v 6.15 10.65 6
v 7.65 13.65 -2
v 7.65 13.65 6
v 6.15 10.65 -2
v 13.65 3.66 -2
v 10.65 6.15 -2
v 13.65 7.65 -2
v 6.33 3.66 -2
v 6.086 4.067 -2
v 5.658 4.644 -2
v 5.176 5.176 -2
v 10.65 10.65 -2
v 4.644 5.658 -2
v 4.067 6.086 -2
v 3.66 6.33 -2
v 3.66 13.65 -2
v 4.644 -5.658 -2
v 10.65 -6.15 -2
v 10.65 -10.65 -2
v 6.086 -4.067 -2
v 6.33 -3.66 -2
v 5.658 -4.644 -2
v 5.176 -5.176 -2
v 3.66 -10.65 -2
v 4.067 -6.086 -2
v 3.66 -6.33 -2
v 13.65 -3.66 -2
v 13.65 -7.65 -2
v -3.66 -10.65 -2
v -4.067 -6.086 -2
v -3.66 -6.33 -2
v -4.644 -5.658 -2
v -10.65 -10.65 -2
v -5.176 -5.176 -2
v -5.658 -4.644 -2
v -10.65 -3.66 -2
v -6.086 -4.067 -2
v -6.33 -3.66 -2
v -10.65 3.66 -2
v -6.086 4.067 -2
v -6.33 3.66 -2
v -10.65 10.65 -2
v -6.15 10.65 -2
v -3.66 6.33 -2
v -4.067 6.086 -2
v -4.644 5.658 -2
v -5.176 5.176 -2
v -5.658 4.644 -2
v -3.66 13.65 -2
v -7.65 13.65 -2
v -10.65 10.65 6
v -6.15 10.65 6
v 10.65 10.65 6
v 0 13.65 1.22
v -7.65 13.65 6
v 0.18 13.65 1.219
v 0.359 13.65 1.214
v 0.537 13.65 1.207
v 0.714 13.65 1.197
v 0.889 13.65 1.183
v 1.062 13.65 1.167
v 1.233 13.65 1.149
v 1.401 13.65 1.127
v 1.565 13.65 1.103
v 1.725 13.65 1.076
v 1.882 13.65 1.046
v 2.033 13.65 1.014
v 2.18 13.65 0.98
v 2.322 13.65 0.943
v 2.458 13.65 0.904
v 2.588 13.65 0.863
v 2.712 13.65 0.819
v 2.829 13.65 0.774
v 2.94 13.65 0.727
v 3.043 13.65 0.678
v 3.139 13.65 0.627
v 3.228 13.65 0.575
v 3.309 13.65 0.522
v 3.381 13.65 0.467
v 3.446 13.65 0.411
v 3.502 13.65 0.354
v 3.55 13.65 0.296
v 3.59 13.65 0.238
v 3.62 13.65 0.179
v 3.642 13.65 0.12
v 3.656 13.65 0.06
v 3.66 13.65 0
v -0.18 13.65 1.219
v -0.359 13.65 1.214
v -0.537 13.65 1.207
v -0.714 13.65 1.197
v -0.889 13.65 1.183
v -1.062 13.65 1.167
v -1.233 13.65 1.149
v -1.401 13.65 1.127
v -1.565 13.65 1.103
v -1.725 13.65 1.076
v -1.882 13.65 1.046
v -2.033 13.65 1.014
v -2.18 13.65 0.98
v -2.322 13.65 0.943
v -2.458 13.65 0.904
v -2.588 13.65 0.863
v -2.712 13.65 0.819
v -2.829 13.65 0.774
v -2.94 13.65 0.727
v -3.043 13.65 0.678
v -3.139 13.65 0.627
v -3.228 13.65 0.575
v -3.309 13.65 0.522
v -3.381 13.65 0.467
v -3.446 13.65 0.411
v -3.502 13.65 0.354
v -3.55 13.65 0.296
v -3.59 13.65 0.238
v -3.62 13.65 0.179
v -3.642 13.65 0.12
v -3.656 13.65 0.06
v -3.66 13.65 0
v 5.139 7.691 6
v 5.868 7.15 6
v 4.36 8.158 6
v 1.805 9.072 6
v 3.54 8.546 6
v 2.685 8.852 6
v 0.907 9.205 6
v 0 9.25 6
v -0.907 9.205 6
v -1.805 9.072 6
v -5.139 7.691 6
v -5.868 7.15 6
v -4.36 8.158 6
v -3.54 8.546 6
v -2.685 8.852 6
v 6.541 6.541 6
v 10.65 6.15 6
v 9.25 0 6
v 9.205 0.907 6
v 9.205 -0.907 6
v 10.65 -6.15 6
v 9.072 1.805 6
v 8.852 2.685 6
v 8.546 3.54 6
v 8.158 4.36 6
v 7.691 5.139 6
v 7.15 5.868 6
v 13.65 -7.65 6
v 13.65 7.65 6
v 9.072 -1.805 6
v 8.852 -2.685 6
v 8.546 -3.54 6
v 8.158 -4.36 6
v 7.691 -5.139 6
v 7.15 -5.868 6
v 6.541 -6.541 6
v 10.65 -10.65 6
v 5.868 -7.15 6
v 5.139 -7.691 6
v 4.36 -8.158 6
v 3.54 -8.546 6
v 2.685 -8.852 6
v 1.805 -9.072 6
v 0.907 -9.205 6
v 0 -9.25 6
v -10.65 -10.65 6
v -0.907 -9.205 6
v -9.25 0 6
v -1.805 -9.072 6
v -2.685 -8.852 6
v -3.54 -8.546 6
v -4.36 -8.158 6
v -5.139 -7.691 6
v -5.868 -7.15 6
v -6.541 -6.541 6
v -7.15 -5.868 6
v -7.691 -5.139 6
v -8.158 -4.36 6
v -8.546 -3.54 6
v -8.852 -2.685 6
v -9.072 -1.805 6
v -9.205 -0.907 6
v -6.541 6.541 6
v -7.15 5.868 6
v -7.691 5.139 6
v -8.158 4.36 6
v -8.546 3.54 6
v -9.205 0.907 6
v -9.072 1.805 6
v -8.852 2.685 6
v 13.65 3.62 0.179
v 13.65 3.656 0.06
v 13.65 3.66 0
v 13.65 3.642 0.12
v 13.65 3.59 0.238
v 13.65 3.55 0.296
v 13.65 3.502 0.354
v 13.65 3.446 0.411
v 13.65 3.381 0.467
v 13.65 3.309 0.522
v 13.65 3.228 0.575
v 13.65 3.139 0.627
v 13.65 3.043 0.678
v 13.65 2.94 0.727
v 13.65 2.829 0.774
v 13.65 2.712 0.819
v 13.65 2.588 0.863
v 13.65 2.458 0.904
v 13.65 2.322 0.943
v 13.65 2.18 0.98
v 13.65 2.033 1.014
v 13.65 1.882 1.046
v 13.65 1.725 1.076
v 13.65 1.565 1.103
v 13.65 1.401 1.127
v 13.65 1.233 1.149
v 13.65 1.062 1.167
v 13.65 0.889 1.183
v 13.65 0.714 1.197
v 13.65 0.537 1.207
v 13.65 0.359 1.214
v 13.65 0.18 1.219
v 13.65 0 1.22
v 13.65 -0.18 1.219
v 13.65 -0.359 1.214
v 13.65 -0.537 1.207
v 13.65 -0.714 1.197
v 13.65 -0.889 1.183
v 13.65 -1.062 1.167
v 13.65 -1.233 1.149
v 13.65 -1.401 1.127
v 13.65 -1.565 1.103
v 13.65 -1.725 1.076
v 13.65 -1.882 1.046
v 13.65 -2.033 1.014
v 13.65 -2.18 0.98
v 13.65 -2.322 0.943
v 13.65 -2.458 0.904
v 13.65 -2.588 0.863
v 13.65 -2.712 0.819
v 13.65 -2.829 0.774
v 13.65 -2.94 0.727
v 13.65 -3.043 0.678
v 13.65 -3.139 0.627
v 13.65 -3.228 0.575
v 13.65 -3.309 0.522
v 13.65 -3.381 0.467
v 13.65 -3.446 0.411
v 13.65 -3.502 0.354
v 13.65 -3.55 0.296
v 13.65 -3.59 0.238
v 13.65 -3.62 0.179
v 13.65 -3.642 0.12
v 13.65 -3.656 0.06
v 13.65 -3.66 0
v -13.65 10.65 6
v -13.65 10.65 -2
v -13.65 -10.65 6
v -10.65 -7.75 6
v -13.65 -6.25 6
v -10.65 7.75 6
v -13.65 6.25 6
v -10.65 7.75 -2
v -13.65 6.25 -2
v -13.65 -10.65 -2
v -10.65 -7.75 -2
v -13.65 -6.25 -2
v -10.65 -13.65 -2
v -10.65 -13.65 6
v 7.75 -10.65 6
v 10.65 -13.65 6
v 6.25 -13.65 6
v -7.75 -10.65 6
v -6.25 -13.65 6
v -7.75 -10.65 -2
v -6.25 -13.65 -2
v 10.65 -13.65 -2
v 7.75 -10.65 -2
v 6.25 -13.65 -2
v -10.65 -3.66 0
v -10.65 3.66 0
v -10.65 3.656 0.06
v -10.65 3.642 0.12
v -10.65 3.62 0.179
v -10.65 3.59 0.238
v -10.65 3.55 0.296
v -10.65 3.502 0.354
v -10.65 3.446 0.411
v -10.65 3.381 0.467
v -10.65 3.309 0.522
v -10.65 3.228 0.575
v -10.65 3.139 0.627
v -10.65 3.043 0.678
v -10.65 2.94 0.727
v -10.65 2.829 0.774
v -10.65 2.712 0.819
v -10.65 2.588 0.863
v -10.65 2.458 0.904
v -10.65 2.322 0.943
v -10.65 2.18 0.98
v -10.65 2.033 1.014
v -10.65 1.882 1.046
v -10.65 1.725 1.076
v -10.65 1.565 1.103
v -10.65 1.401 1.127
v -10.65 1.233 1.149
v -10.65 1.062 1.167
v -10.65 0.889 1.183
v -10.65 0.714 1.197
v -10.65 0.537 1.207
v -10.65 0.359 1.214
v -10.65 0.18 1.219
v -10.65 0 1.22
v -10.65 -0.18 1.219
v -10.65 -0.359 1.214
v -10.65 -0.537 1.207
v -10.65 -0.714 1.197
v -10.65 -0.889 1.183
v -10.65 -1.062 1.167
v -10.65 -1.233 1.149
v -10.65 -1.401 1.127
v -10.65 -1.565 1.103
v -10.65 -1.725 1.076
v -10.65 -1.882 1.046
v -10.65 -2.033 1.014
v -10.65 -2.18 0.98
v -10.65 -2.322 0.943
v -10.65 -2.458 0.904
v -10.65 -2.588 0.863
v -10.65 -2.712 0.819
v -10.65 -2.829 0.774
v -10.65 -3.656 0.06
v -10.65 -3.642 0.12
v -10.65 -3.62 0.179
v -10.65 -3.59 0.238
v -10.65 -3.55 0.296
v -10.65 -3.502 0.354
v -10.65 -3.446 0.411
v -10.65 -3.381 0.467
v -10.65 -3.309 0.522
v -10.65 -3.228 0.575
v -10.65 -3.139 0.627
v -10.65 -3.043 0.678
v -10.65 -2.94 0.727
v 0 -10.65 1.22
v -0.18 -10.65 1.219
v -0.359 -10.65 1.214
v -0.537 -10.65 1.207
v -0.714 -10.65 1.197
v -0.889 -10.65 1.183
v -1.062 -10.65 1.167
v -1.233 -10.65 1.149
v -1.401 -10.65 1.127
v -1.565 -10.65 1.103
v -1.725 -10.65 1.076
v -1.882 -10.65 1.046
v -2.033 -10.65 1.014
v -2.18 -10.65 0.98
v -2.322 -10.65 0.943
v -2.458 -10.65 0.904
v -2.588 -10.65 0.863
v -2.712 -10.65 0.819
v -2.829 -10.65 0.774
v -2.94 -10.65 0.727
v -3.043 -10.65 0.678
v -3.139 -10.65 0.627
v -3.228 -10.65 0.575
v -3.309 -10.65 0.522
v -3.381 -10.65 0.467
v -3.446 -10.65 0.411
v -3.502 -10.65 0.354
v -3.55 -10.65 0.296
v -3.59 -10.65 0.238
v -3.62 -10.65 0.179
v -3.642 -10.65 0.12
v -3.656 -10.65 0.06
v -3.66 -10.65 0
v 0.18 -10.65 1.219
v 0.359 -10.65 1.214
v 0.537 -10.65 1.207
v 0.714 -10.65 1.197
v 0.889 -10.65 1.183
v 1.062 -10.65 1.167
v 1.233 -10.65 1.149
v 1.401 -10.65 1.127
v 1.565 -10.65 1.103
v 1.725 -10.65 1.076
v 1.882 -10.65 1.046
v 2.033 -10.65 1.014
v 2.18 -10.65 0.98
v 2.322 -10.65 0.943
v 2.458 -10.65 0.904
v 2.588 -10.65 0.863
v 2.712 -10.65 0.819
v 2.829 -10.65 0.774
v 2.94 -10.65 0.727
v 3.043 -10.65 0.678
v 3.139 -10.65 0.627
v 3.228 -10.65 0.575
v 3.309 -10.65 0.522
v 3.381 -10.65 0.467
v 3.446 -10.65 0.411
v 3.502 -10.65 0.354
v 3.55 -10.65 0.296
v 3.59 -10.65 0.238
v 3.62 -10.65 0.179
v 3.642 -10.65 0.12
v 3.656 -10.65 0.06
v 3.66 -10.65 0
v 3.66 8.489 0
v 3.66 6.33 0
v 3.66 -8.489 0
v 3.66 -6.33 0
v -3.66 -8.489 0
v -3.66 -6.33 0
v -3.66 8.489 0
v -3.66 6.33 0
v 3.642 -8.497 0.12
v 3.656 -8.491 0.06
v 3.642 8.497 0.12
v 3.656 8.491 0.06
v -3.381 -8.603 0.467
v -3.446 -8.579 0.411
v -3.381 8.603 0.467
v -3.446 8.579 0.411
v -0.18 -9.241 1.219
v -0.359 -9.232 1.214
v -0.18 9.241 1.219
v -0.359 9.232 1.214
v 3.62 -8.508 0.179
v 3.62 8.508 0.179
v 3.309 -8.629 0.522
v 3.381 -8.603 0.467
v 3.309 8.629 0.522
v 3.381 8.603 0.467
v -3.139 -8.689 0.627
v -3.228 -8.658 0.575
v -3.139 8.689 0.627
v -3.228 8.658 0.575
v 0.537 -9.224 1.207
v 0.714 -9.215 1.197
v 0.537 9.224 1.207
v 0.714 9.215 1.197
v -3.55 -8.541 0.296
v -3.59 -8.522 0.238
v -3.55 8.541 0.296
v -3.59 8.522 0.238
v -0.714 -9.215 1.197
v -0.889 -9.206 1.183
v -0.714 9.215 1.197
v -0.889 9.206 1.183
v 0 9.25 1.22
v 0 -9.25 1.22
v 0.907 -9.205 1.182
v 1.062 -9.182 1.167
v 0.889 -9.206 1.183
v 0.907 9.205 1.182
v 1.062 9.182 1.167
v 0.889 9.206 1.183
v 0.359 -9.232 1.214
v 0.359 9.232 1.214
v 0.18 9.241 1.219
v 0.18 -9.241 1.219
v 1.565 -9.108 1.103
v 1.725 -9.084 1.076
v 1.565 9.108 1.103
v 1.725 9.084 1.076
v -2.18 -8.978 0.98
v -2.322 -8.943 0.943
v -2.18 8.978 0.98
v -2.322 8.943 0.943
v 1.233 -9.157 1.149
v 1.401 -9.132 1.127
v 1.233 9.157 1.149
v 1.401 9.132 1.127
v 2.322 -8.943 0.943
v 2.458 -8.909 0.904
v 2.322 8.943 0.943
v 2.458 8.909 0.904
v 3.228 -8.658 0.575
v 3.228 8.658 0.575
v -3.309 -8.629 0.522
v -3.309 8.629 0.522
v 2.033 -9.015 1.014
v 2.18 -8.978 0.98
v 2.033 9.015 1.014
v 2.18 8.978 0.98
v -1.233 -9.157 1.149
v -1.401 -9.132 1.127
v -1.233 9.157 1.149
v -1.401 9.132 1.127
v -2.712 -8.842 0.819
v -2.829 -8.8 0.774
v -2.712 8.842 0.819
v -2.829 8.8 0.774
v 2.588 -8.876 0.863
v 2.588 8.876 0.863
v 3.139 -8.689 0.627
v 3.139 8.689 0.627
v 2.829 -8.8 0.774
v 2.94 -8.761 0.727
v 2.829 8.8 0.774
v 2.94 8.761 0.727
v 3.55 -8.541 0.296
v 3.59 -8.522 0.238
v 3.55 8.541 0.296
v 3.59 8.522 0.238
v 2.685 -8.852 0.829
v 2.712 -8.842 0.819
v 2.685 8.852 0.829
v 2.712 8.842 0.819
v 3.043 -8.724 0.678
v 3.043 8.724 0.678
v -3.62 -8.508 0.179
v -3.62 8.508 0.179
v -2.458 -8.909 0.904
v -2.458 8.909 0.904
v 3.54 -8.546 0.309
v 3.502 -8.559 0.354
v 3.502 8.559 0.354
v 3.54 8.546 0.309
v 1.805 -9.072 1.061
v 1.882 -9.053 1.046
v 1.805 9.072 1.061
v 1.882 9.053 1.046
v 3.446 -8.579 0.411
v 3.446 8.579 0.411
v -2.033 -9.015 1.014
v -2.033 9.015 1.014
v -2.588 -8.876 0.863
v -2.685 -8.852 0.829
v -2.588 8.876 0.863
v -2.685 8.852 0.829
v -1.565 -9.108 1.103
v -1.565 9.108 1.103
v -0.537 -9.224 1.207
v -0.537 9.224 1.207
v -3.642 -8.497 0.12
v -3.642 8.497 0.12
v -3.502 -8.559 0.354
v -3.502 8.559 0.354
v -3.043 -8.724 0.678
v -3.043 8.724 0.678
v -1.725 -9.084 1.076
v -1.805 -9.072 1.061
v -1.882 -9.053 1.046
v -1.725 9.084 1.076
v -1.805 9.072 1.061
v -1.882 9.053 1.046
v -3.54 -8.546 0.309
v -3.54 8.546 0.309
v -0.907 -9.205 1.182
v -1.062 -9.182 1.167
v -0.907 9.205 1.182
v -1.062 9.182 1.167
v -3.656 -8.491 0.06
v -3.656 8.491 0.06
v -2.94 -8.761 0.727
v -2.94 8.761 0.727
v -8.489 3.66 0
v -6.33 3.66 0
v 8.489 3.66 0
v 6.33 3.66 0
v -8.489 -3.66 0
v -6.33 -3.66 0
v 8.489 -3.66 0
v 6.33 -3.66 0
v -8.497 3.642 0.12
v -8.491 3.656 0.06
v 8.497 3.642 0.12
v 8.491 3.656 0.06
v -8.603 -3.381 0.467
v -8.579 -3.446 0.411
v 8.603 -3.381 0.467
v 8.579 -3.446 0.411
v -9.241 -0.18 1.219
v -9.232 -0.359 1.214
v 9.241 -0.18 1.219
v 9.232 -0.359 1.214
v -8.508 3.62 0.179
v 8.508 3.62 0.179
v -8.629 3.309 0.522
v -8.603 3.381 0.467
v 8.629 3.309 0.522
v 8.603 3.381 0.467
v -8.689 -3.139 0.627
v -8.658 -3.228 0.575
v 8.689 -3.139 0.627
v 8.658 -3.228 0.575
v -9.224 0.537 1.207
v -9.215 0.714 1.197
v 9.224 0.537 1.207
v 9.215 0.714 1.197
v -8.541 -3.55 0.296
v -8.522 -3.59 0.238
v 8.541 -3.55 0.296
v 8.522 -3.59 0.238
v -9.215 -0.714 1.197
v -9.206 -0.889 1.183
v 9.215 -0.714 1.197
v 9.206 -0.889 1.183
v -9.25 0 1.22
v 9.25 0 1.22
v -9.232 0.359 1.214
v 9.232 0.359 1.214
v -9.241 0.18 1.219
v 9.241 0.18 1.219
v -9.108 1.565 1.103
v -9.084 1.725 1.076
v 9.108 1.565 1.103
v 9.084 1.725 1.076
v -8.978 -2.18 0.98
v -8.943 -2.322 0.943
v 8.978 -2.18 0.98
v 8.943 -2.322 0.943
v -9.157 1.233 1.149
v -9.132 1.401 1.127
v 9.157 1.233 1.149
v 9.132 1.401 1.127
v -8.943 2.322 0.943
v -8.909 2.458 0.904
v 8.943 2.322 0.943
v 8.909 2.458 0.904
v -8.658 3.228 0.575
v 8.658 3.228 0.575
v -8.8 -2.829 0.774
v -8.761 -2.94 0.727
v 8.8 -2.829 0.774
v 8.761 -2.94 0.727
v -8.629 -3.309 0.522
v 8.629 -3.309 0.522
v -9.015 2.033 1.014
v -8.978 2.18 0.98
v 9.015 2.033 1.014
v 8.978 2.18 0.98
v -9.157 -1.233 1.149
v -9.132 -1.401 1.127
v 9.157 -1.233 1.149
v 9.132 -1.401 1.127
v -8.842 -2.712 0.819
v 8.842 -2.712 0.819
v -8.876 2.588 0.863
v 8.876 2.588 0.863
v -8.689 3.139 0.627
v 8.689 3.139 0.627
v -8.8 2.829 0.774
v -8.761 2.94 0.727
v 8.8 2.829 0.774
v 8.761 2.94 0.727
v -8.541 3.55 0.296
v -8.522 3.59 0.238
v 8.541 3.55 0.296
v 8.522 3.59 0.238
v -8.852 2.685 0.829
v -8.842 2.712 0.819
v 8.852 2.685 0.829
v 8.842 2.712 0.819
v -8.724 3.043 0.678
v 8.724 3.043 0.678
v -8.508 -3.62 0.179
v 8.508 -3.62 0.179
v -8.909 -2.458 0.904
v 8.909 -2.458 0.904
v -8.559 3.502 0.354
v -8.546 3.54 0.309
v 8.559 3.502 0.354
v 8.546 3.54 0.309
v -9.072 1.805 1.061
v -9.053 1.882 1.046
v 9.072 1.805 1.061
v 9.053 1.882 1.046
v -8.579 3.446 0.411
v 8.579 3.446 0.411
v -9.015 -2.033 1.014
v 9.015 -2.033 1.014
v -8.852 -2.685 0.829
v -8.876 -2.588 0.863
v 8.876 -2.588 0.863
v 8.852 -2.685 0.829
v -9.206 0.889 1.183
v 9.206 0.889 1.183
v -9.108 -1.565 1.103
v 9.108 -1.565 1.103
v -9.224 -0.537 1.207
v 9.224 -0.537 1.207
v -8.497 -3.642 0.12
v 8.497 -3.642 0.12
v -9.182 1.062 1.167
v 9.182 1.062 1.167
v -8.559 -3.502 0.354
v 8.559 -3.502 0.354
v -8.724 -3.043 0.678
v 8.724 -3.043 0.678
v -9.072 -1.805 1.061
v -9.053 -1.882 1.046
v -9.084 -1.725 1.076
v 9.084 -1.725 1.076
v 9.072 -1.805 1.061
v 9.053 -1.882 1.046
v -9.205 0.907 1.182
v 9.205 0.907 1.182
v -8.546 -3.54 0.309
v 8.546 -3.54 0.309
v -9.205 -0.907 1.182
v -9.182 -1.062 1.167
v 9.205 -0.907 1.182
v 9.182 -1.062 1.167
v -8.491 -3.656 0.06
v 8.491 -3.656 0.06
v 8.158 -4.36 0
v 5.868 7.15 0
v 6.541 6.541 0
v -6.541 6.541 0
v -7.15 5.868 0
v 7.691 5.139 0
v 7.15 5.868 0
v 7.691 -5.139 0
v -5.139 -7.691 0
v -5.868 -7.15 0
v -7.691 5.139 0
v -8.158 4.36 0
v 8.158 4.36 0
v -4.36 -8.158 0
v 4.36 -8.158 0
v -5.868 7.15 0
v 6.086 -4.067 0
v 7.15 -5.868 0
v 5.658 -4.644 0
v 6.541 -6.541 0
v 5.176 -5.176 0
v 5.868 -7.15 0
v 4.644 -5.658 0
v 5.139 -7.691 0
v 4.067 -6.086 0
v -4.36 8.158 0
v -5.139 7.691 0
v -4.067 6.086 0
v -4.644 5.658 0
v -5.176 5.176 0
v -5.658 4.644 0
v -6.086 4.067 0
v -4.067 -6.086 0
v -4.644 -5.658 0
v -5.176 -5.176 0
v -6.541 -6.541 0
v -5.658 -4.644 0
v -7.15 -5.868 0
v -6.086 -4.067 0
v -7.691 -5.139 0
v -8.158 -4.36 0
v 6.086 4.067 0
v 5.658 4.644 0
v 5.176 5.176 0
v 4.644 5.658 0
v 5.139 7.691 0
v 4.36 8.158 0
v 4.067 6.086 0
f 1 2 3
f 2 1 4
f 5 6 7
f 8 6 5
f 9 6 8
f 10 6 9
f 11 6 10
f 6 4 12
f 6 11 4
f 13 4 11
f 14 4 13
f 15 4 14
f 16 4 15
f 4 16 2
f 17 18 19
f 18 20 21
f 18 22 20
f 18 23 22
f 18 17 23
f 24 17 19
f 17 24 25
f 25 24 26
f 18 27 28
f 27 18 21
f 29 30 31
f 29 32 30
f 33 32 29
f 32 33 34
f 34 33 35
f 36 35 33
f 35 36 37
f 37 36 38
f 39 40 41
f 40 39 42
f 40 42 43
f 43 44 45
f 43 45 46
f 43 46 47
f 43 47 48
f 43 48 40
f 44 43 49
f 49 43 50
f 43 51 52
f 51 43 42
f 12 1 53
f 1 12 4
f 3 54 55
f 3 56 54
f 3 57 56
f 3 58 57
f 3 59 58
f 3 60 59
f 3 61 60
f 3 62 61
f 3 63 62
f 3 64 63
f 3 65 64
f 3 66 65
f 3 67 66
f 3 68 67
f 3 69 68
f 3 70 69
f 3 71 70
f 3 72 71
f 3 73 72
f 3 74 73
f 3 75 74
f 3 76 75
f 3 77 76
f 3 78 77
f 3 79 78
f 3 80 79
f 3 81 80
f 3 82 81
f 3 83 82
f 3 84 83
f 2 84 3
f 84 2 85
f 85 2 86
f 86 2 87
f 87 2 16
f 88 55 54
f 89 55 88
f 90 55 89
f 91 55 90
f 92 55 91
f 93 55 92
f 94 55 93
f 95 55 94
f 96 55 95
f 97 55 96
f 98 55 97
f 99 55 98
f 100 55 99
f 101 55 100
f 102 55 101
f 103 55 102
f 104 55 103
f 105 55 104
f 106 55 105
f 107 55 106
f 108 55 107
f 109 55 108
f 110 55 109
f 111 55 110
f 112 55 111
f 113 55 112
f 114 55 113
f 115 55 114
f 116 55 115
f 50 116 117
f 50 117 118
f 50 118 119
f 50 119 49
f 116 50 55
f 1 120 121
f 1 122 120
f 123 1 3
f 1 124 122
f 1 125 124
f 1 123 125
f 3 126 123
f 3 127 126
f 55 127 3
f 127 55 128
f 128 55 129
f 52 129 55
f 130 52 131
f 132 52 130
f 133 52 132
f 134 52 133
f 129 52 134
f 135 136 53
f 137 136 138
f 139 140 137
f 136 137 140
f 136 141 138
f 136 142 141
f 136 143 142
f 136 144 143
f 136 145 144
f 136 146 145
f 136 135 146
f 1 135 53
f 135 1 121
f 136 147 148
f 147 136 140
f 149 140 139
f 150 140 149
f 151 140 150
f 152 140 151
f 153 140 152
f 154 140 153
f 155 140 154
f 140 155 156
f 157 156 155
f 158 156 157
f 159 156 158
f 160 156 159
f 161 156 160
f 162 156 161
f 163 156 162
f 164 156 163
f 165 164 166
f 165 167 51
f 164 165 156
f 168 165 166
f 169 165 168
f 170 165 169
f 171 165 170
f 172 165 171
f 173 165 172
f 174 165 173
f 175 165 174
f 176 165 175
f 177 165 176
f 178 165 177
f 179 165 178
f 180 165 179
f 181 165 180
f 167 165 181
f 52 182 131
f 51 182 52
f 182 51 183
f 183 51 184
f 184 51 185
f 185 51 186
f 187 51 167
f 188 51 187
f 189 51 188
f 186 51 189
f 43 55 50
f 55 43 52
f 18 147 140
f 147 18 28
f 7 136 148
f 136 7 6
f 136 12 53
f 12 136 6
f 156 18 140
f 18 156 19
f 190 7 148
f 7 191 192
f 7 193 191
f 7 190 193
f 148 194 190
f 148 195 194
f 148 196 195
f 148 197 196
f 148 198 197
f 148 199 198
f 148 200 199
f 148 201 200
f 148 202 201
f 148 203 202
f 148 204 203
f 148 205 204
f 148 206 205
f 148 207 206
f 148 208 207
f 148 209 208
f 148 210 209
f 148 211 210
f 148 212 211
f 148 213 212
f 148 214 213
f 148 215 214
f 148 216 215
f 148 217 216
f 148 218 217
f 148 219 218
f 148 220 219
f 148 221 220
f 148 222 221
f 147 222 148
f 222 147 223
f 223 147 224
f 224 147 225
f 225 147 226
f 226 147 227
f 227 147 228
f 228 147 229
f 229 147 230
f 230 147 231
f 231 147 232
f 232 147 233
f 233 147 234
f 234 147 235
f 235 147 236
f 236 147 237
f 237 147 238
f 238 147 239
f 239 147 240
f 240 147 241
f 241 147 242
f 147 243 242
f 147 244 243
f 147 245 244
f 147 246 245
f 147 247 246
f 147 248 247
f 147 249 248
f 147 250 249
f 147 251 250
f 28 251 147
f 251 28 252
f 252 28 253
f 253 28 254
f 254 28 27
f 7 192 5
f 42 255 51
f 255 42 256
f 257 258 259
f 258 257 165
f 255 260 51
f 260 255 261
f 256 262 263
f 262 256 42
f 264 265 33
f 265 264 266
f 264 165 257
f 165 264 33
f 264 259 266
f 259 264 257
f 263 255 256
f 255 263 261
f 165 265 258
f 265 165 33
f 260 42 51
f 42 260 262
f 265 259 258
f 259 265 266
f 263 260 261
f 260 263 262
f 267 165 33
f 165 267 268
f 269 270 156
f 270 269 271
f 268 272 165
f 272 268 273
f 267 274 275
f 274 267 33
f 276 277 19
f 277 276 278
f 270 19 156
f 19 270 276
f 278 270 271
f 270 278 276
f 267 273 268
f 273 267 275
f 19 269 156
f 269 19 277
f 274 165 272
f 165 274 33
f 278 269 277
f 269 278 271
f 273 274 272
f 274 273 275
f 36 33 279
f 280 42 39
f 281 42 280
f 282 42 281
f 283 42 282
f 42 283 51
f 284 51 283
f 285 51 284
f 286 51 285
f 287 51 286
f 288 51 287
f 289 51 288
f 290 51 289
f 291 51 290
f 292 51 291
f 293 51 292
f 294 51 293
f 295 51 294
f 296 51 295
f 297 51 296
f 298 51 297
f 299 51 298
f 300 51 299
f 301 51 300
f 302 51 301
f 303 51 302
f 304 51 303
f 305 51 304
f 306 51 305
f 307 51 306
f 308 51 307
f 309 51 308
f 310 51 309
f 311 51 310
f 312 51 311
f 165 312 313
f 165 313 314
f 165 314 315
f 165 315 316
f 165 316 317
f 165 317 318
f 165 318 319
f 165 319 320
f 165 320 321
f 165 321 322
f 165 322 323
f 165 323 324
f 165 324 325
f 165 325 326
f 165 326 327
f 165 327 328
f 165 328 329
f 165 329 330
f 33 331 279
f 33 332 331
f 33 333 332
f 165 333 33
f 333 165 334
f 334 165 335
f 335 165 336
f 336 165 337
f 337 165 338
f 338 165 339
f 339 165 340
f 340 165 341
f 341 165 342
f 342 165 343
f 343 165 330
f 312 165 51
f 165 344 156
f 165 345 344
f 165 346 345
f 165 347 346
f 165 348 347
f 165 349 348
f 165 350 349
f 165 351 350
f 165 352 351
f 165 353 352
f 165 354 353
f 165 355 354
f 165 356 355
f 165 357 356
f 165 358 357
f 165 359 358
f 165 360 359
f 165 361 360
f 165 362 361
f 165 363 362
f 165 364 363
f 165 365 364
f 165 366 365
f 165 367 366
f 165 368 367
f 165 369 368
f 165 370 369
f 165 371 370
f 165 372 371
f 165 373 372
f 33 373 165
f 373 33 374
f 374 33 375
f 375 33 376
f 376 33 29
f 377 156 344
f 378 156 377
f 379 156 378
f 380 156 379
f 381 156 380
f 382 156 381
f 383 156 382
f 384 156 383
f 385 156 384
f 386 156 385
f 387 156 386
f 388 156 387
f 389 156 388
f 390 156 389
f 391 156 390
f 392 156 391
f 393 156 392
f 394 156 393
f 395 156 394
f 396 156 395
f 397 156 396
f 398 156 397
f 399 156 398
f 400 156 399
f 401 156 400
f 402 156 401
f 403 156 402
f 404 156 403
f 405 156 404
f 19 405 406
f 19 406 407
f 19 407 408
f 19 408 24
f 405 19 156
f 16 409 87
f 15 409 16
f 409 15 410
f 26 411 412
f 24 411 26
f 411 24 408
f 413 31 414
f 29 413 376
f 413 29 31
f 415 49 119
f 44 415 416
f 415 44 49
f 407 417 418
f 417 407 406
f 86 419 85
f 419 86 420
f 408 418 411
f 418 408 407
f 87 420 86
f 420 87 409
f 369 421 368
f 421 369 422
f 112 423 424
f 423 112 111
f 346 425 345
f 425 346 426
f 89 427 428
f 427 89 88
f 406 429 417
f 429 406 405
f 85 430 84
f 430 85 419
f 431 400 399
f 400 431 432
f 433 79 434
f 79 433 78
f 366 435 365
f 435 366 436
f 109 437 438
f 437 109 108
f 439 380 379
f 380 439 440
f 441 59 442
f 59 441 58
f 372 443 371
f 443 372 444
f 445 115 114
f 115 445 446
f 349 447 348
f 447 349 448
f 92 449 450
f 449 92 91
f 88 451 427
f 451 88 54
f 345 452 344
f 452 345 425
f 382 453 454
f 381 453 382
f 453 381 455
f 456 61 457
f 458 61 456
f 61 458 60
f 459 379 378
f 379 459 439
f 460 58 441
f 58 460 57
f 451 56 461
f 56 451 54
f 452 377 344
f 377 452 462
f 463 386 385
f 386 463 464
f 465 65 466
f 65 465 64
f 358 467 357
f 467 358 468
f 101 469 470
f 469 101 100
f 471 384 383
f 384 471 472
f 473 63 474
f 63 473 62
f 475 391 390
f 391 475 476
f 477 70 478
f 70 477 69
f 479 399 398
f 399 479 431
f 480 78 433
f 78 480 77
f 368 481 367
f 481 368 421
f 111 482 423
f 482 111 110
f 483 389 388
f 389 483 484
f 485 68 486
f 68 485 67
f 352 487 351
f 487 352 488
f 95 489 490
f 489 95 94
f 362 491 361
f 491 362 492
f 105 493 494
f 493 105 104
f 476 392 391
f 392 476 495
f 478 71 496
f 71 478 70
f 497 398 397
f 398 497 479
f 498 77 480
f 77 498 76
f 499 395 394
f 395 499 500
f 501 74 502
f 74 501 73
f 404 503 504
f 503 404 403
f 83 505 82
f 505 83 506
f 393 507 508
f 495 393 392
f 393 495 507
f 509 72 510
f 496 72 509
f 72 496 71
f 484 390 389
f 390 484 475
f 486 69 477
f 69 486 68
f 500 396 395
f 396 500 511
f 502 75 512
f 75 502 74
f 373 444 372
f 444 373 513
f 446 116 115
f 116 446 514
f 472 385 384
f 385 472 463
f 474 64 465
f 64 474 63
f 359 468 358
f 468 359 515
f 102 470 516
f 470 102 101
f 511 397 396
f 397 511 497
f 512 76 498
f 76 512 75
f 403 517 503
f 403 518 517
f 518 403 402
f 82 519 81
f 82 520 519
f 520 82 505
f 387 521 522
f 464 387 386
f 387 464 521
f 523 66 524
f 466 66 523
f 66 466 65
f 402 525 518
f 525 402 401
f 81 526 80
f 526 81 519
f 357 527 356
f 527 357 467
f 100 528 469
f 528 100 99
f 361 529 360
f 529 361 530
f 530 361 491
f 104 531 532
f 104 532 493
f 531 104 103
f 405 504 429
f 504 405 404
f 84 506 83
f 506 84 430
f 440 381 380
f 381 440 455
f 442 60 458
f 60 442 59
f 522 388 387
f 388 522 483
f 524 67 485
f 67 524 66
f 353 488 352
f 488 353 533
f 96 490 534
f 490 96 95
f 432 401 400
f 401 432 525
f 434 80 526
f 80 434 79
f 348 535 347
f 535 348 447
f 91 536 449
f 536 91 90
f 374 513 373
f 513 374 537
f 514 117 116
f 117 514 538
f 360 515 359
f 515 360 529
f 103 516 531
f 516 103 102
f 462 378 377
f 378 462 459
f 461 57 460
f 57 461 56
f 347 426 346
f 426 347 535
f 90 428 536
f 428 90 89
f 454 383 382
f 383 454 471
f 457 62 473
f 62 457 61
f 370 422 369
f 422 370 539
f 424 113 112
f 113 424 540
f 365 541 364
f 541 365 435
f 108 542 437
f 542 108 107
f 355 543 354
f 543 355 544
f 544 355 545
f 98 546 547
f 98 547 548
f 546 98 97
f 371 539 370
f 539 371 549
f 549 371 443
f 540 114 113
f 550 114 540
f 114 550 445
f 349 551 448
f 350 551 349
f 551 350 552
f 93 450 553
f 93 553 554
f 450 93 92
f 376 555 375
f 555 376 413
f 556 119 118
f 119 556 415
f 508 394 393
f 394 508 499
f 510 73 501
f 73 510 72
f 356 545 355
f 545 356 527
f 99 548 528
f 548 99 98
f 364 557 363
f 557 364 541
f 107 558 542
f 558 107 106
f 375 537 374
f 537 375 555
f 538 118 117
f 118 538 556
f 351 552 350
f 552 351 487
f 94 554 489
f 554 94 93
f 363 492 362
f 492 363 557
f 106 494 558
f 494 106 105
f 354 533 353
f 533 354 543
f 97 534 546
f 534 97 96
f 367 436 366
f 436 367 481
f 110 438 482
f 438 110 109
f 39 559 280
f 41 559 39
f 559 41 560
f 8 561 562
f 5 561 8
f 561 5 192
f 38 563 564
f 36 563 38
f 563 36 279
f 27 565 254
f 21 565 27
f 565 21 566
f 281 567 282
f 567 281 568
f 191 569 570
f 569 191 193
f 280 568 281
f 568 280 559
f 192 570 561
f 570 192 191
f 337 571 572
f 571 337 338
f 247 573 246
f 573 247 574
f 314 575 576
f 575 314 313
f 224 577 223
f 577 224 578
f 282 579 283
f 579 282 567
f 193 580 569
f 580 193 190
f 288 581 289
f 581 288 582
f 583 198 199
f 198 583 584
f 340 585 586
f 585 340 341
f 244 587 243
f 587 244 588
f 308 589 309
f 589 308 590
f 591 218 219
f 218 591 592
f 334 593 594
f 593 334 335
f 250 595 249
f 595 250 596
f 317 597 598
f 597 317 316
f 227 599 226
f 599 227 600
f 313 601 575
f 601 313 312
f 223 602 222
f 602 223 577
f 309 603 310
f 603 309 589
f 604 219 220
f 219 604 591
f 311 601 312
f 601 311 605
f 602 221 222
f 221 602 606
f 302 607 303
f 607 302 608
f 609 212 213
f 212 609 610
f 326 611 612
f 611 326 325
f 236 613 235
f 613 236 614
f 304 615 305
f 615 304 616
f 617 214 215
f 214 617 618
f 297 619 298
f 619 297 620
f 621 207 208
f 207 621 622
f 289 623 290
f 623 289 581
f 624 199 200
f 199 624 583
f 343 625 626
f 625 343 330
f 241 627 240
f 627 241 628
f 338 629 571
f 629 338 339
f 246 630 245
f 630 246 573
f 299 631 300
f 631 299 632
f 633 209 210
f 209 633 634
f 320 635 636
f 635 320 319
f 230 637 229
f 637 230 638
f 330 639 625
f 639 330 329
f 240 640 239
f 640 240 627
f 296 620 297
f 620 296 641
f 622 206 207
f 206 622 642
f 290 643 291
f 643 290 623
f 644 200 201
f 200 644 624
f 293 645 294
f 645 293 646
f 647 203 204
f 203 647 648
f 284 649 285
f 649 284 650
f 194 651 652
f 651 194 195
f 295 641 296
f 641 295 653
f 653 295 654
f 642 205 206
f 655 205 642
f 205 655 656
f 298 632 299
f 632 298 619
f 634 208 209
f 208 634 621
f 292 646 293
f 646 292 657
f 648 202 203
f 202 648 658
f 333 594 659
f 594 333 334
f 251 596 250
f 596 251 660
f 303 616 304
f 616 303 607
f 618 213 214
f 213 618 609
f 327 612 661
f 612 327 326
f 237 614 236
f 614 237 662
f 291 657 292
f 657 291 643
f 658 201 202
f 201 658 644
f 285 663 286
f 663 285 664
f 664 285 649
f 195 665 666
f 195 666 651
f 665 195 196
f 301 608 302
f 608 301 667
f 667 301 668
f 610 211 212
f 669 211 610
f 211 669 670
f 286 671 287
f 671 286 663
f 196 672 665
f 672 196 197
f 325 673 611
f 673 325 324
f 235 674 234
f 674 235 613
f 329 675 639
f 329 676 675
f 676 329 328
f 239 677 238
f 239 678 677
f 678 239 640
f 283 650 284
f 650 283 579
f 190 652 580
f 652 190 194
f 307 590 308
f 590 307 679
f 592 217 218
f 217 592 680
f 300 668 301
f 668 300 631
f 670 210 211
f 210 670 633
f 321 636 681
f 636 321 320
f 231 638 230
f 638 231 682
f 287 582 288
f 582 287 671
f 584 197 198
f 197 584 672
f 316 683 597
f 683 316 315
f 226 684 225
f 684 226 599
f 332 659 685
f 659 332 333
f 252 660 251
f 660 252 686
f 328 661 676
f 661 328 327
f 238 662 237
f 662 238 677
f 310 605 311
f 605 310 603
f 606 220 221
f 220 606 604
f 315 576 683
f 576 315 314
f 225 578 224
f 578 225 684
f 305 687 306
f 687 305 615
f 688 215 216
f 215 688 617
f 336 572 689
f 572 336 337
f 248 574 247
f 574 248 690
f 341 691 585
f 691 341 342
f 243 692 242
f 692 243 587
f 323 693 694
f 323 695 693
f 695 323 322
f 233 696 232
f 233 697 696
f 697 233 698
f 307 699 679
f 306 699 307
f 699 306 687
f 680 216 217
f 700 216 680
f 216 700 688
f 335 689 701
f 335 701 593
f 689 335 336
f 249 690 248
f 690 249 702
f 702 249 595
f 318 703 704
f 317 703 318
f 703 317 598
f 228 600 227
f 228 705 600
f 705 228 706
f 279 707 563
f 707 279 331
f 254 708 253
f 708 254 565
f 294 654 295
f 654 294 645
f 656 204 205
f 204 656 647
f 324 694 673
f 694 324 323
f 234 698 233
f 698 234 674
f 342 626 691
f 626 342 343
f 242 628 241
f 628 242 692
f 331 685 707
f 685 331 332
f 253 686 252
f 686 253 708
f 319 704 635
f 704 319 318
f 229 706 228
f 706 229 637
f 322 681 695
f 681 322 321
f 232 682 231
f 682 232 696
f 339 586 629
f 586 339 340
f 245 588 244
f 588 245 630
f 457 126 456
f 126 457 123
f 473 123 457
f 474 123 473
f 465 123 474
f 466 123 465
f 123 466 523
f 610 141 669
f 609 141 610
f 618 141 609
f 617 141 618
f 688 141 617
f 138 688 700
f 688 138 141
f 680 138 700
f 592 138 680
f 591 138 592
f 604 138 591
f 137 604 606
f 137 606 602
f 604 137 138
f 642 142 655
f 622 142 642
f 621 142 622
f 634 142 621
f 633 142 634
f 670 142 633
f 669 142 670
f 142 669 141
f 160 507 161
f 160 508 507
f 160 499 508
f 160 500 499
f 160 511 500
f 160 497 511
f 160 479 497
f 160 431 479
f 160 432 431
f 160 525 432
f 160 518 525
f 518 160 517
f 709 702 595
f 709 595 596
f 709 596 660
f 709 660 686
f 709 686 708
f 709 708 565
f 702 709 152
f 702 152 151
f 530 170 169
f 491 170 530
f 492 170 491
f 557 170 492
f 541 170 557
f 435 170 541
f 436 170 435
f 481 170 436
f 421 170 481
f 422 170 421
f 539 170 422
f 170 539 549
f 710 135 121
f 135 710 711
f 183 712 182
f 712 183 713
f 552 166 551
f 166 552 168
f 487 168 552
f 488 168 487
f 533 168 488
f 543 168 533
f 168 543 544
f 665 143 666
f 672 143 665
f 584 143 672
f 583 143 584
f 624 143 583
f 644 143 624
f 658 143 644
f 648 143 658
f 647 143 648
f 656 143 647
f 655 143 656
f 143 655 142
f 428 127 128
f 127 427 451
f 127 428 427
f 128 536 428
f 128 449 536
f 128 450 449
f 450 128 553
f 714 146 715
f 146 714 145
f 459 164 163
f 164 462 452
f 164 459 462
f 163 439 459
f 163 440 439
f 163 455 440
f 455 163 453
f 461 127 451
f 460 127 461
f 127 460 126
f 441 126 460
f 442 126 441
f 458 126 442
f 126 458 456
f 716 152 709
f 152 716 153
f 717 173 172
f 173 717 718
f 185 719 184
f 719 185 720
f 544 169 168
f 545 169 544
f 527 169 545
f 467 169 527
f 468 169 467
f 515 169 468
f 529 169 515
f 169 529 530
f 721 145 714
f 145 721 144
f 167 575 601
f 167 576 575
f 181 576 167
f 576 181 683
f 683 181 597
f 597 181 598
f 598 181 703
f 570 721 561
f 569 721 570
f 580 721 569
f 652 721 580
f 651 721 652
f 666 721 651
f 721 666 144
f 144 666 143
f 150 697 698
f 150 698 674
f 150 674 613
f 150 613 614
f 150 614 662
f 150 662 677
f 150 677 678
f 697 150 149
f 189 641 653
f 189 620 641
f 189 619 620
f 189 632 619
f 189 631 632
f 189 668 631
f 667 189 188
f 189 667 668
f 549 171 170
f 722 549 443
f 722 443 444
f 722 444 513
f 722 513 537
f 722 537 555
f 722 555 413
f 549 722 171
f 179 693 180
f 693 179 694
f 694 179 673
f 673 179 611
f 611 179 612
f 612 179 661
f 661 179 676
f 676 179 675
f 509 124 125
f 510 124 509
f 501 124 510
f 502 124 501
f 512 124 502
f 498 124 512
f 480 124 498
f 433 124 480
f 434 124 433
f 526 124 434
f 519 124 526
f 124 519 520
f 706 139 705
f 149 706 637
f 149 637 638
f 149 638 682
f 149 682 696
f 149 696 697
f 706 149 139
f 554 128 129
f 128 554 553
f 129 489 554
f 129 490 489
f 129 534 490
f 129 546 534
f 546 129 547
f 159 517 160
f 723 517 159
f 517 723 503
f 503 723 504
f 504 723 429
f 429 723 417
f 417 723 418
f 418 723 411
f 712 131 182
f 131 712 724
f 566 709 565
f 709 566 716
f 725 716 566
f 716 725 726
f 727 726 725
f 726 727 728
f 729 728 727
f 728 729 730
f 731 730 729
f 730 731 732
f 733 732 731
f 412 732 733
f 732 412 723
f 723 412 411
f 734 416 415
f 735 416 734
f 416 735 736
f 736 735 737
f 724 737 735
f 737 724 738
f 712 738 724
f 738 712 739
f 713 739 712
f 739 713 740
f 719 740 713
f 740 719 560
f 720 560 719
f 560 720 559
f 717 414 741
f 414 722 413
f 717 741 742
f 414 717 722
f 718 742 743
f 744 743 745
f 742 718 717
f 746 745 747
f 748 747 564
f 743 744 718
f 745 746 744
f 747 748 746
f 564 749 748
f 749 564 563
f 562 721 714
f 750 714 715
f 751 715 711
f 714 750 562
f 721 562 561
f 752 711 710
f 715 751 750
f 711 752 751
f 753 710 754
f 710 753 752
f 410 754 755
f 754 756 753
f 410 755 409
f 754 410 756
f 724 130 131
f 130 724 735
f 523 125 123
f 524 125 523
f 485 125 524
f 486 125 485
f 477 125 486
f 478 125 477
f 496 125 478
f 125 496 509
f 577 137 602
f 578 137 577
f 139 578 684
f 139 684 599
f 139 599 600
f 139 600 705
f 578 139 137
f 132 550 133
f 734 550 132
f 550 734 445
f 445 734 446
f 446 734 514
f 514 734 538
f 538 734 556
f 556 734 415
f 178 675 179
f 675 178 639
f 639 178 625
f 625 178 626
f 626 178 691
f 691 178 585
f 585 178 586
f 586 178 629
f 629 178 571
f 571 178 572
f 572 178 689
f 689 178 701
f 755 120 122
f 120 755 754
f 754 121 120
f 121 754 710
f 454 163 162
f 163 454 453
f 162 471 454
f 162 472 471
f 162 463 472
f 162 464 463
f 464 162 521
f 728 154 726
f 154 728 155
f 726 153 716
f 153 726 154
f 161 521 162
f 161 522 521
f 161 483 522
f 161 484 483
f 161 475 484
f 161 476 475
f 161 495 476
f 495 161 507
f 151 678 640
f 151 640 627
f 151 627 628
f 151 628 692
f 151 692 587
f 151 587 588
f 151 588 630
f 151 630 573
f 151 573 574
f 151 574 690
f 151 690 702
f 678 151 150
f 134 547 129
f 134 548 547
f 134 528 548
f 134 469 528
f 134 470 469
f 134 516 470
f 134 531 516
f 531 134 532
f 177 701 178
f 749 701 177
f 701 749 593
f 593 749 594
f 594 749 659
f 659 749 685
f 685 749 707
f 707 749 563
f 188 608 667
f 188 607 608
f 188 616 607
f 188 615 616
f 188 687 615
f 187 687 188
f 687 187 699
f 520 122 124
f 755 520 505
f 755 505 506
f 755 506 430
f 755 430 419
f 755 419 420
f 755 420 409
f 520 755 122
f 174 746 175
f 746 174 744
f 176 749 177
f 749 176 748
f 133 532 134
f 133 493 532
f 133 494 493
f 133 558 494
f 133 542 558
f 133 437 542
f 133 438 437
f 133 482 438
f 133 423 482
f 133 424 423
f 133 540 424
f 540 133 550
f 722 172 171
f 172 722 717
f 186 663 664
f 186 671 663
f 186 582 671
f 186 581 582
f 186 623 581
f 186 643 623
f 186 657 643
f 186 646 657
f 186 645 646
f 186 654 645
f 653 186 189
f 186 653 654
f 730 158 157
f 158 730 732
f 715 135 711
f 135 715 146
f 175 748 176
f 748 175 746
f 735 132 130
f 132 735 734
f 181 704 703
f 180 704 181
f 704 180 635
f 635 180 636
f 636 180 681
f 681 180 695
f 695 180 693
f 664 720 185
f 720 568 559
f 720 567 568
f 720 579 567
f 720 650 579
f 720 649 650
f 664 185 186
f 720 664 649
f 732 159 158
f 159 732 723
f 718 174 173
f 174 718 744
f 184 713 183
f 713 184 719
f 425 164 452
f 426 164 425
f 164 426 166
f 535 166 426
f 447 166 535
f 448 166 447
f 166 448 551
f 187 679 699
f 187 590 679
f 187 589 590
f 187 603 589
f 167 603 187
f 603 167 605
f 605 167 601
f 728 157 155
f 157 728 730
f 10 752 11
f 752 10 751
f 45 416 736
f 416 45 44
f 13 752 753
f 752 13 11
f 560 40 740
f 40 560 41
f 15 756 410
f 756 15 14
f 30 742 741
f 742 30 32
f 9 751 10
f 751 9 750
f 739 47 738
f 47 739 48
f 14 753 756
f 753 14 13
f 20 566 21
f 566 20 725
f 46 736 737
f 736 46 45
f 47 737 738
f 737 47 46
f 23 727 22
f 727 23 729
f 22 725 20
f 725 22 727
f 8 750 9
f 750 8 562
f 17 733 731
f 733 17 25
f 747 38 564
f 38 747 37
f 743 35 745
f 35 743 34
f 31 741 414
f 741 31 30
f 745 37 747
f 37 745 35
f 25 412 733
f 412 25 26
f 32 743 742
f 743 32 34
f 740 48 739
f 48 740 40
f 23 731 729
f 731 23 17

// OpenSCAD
// file: ../cells.scad
// cells.scad: sizes of common cylindrical cells, and a simple cell model.
//
// [name, diameter, length] in mm, length over the terminals. The alkaline
// sizes are the IEC 60086-2 maxima; the lithium sizes follow their names
// (diameter and length in tenths of a mm, so 21700 is 21.0 x 70.0), except
// 18650 and 26650, which are measured cells. Real cells vary: measure yours,
// or pass a diameter straight to battery_holder().

CELLS = [
    ["AAA", 10.5, 44.5],
    ["AA", 14.5, 50.5],
    ["C", 26.2, 50.0],
    ["D", 34.2, 61.5],
    ["CR123A", 17.0, 34.5],
    ["18650", 18.3, 64.8],
    ["21700", 21.0, 70.0],
    ["26650", 26.5, 66.0],
];

function cell_row(name) =
    let (i = search([name], CELLS)[0])
    assert(i != [], str("unknown cell ", name, "; known cells are ", [for (c = CELLS) c[0]]))
    CELLS[i];

function cell_diameter(name) = cell_row(name)[1];
function cell_length(name) = cell_row(name)[2];

// A cell standing on its negative end at z = 0, with a small positive nub.
module cell(name) {
    d = cell_diameter(name);
    l = cell_length(name);
    nub = min(1, l / 40);
    cylinder(d=d, h=l - nub);
    translate([0, 0, l - nub - 0.01]) cylinder(d=d / 3, h=nub + 0.01);
}
// main file
// Using the library in your own model: one holder for an 18650 cell.
use <../cells.scad>
use <../battery_holder.scad>

battery_holder(diameter=cell_diameter("18650"), height=6, wall_thickness=3, retainer_thickness=2);
